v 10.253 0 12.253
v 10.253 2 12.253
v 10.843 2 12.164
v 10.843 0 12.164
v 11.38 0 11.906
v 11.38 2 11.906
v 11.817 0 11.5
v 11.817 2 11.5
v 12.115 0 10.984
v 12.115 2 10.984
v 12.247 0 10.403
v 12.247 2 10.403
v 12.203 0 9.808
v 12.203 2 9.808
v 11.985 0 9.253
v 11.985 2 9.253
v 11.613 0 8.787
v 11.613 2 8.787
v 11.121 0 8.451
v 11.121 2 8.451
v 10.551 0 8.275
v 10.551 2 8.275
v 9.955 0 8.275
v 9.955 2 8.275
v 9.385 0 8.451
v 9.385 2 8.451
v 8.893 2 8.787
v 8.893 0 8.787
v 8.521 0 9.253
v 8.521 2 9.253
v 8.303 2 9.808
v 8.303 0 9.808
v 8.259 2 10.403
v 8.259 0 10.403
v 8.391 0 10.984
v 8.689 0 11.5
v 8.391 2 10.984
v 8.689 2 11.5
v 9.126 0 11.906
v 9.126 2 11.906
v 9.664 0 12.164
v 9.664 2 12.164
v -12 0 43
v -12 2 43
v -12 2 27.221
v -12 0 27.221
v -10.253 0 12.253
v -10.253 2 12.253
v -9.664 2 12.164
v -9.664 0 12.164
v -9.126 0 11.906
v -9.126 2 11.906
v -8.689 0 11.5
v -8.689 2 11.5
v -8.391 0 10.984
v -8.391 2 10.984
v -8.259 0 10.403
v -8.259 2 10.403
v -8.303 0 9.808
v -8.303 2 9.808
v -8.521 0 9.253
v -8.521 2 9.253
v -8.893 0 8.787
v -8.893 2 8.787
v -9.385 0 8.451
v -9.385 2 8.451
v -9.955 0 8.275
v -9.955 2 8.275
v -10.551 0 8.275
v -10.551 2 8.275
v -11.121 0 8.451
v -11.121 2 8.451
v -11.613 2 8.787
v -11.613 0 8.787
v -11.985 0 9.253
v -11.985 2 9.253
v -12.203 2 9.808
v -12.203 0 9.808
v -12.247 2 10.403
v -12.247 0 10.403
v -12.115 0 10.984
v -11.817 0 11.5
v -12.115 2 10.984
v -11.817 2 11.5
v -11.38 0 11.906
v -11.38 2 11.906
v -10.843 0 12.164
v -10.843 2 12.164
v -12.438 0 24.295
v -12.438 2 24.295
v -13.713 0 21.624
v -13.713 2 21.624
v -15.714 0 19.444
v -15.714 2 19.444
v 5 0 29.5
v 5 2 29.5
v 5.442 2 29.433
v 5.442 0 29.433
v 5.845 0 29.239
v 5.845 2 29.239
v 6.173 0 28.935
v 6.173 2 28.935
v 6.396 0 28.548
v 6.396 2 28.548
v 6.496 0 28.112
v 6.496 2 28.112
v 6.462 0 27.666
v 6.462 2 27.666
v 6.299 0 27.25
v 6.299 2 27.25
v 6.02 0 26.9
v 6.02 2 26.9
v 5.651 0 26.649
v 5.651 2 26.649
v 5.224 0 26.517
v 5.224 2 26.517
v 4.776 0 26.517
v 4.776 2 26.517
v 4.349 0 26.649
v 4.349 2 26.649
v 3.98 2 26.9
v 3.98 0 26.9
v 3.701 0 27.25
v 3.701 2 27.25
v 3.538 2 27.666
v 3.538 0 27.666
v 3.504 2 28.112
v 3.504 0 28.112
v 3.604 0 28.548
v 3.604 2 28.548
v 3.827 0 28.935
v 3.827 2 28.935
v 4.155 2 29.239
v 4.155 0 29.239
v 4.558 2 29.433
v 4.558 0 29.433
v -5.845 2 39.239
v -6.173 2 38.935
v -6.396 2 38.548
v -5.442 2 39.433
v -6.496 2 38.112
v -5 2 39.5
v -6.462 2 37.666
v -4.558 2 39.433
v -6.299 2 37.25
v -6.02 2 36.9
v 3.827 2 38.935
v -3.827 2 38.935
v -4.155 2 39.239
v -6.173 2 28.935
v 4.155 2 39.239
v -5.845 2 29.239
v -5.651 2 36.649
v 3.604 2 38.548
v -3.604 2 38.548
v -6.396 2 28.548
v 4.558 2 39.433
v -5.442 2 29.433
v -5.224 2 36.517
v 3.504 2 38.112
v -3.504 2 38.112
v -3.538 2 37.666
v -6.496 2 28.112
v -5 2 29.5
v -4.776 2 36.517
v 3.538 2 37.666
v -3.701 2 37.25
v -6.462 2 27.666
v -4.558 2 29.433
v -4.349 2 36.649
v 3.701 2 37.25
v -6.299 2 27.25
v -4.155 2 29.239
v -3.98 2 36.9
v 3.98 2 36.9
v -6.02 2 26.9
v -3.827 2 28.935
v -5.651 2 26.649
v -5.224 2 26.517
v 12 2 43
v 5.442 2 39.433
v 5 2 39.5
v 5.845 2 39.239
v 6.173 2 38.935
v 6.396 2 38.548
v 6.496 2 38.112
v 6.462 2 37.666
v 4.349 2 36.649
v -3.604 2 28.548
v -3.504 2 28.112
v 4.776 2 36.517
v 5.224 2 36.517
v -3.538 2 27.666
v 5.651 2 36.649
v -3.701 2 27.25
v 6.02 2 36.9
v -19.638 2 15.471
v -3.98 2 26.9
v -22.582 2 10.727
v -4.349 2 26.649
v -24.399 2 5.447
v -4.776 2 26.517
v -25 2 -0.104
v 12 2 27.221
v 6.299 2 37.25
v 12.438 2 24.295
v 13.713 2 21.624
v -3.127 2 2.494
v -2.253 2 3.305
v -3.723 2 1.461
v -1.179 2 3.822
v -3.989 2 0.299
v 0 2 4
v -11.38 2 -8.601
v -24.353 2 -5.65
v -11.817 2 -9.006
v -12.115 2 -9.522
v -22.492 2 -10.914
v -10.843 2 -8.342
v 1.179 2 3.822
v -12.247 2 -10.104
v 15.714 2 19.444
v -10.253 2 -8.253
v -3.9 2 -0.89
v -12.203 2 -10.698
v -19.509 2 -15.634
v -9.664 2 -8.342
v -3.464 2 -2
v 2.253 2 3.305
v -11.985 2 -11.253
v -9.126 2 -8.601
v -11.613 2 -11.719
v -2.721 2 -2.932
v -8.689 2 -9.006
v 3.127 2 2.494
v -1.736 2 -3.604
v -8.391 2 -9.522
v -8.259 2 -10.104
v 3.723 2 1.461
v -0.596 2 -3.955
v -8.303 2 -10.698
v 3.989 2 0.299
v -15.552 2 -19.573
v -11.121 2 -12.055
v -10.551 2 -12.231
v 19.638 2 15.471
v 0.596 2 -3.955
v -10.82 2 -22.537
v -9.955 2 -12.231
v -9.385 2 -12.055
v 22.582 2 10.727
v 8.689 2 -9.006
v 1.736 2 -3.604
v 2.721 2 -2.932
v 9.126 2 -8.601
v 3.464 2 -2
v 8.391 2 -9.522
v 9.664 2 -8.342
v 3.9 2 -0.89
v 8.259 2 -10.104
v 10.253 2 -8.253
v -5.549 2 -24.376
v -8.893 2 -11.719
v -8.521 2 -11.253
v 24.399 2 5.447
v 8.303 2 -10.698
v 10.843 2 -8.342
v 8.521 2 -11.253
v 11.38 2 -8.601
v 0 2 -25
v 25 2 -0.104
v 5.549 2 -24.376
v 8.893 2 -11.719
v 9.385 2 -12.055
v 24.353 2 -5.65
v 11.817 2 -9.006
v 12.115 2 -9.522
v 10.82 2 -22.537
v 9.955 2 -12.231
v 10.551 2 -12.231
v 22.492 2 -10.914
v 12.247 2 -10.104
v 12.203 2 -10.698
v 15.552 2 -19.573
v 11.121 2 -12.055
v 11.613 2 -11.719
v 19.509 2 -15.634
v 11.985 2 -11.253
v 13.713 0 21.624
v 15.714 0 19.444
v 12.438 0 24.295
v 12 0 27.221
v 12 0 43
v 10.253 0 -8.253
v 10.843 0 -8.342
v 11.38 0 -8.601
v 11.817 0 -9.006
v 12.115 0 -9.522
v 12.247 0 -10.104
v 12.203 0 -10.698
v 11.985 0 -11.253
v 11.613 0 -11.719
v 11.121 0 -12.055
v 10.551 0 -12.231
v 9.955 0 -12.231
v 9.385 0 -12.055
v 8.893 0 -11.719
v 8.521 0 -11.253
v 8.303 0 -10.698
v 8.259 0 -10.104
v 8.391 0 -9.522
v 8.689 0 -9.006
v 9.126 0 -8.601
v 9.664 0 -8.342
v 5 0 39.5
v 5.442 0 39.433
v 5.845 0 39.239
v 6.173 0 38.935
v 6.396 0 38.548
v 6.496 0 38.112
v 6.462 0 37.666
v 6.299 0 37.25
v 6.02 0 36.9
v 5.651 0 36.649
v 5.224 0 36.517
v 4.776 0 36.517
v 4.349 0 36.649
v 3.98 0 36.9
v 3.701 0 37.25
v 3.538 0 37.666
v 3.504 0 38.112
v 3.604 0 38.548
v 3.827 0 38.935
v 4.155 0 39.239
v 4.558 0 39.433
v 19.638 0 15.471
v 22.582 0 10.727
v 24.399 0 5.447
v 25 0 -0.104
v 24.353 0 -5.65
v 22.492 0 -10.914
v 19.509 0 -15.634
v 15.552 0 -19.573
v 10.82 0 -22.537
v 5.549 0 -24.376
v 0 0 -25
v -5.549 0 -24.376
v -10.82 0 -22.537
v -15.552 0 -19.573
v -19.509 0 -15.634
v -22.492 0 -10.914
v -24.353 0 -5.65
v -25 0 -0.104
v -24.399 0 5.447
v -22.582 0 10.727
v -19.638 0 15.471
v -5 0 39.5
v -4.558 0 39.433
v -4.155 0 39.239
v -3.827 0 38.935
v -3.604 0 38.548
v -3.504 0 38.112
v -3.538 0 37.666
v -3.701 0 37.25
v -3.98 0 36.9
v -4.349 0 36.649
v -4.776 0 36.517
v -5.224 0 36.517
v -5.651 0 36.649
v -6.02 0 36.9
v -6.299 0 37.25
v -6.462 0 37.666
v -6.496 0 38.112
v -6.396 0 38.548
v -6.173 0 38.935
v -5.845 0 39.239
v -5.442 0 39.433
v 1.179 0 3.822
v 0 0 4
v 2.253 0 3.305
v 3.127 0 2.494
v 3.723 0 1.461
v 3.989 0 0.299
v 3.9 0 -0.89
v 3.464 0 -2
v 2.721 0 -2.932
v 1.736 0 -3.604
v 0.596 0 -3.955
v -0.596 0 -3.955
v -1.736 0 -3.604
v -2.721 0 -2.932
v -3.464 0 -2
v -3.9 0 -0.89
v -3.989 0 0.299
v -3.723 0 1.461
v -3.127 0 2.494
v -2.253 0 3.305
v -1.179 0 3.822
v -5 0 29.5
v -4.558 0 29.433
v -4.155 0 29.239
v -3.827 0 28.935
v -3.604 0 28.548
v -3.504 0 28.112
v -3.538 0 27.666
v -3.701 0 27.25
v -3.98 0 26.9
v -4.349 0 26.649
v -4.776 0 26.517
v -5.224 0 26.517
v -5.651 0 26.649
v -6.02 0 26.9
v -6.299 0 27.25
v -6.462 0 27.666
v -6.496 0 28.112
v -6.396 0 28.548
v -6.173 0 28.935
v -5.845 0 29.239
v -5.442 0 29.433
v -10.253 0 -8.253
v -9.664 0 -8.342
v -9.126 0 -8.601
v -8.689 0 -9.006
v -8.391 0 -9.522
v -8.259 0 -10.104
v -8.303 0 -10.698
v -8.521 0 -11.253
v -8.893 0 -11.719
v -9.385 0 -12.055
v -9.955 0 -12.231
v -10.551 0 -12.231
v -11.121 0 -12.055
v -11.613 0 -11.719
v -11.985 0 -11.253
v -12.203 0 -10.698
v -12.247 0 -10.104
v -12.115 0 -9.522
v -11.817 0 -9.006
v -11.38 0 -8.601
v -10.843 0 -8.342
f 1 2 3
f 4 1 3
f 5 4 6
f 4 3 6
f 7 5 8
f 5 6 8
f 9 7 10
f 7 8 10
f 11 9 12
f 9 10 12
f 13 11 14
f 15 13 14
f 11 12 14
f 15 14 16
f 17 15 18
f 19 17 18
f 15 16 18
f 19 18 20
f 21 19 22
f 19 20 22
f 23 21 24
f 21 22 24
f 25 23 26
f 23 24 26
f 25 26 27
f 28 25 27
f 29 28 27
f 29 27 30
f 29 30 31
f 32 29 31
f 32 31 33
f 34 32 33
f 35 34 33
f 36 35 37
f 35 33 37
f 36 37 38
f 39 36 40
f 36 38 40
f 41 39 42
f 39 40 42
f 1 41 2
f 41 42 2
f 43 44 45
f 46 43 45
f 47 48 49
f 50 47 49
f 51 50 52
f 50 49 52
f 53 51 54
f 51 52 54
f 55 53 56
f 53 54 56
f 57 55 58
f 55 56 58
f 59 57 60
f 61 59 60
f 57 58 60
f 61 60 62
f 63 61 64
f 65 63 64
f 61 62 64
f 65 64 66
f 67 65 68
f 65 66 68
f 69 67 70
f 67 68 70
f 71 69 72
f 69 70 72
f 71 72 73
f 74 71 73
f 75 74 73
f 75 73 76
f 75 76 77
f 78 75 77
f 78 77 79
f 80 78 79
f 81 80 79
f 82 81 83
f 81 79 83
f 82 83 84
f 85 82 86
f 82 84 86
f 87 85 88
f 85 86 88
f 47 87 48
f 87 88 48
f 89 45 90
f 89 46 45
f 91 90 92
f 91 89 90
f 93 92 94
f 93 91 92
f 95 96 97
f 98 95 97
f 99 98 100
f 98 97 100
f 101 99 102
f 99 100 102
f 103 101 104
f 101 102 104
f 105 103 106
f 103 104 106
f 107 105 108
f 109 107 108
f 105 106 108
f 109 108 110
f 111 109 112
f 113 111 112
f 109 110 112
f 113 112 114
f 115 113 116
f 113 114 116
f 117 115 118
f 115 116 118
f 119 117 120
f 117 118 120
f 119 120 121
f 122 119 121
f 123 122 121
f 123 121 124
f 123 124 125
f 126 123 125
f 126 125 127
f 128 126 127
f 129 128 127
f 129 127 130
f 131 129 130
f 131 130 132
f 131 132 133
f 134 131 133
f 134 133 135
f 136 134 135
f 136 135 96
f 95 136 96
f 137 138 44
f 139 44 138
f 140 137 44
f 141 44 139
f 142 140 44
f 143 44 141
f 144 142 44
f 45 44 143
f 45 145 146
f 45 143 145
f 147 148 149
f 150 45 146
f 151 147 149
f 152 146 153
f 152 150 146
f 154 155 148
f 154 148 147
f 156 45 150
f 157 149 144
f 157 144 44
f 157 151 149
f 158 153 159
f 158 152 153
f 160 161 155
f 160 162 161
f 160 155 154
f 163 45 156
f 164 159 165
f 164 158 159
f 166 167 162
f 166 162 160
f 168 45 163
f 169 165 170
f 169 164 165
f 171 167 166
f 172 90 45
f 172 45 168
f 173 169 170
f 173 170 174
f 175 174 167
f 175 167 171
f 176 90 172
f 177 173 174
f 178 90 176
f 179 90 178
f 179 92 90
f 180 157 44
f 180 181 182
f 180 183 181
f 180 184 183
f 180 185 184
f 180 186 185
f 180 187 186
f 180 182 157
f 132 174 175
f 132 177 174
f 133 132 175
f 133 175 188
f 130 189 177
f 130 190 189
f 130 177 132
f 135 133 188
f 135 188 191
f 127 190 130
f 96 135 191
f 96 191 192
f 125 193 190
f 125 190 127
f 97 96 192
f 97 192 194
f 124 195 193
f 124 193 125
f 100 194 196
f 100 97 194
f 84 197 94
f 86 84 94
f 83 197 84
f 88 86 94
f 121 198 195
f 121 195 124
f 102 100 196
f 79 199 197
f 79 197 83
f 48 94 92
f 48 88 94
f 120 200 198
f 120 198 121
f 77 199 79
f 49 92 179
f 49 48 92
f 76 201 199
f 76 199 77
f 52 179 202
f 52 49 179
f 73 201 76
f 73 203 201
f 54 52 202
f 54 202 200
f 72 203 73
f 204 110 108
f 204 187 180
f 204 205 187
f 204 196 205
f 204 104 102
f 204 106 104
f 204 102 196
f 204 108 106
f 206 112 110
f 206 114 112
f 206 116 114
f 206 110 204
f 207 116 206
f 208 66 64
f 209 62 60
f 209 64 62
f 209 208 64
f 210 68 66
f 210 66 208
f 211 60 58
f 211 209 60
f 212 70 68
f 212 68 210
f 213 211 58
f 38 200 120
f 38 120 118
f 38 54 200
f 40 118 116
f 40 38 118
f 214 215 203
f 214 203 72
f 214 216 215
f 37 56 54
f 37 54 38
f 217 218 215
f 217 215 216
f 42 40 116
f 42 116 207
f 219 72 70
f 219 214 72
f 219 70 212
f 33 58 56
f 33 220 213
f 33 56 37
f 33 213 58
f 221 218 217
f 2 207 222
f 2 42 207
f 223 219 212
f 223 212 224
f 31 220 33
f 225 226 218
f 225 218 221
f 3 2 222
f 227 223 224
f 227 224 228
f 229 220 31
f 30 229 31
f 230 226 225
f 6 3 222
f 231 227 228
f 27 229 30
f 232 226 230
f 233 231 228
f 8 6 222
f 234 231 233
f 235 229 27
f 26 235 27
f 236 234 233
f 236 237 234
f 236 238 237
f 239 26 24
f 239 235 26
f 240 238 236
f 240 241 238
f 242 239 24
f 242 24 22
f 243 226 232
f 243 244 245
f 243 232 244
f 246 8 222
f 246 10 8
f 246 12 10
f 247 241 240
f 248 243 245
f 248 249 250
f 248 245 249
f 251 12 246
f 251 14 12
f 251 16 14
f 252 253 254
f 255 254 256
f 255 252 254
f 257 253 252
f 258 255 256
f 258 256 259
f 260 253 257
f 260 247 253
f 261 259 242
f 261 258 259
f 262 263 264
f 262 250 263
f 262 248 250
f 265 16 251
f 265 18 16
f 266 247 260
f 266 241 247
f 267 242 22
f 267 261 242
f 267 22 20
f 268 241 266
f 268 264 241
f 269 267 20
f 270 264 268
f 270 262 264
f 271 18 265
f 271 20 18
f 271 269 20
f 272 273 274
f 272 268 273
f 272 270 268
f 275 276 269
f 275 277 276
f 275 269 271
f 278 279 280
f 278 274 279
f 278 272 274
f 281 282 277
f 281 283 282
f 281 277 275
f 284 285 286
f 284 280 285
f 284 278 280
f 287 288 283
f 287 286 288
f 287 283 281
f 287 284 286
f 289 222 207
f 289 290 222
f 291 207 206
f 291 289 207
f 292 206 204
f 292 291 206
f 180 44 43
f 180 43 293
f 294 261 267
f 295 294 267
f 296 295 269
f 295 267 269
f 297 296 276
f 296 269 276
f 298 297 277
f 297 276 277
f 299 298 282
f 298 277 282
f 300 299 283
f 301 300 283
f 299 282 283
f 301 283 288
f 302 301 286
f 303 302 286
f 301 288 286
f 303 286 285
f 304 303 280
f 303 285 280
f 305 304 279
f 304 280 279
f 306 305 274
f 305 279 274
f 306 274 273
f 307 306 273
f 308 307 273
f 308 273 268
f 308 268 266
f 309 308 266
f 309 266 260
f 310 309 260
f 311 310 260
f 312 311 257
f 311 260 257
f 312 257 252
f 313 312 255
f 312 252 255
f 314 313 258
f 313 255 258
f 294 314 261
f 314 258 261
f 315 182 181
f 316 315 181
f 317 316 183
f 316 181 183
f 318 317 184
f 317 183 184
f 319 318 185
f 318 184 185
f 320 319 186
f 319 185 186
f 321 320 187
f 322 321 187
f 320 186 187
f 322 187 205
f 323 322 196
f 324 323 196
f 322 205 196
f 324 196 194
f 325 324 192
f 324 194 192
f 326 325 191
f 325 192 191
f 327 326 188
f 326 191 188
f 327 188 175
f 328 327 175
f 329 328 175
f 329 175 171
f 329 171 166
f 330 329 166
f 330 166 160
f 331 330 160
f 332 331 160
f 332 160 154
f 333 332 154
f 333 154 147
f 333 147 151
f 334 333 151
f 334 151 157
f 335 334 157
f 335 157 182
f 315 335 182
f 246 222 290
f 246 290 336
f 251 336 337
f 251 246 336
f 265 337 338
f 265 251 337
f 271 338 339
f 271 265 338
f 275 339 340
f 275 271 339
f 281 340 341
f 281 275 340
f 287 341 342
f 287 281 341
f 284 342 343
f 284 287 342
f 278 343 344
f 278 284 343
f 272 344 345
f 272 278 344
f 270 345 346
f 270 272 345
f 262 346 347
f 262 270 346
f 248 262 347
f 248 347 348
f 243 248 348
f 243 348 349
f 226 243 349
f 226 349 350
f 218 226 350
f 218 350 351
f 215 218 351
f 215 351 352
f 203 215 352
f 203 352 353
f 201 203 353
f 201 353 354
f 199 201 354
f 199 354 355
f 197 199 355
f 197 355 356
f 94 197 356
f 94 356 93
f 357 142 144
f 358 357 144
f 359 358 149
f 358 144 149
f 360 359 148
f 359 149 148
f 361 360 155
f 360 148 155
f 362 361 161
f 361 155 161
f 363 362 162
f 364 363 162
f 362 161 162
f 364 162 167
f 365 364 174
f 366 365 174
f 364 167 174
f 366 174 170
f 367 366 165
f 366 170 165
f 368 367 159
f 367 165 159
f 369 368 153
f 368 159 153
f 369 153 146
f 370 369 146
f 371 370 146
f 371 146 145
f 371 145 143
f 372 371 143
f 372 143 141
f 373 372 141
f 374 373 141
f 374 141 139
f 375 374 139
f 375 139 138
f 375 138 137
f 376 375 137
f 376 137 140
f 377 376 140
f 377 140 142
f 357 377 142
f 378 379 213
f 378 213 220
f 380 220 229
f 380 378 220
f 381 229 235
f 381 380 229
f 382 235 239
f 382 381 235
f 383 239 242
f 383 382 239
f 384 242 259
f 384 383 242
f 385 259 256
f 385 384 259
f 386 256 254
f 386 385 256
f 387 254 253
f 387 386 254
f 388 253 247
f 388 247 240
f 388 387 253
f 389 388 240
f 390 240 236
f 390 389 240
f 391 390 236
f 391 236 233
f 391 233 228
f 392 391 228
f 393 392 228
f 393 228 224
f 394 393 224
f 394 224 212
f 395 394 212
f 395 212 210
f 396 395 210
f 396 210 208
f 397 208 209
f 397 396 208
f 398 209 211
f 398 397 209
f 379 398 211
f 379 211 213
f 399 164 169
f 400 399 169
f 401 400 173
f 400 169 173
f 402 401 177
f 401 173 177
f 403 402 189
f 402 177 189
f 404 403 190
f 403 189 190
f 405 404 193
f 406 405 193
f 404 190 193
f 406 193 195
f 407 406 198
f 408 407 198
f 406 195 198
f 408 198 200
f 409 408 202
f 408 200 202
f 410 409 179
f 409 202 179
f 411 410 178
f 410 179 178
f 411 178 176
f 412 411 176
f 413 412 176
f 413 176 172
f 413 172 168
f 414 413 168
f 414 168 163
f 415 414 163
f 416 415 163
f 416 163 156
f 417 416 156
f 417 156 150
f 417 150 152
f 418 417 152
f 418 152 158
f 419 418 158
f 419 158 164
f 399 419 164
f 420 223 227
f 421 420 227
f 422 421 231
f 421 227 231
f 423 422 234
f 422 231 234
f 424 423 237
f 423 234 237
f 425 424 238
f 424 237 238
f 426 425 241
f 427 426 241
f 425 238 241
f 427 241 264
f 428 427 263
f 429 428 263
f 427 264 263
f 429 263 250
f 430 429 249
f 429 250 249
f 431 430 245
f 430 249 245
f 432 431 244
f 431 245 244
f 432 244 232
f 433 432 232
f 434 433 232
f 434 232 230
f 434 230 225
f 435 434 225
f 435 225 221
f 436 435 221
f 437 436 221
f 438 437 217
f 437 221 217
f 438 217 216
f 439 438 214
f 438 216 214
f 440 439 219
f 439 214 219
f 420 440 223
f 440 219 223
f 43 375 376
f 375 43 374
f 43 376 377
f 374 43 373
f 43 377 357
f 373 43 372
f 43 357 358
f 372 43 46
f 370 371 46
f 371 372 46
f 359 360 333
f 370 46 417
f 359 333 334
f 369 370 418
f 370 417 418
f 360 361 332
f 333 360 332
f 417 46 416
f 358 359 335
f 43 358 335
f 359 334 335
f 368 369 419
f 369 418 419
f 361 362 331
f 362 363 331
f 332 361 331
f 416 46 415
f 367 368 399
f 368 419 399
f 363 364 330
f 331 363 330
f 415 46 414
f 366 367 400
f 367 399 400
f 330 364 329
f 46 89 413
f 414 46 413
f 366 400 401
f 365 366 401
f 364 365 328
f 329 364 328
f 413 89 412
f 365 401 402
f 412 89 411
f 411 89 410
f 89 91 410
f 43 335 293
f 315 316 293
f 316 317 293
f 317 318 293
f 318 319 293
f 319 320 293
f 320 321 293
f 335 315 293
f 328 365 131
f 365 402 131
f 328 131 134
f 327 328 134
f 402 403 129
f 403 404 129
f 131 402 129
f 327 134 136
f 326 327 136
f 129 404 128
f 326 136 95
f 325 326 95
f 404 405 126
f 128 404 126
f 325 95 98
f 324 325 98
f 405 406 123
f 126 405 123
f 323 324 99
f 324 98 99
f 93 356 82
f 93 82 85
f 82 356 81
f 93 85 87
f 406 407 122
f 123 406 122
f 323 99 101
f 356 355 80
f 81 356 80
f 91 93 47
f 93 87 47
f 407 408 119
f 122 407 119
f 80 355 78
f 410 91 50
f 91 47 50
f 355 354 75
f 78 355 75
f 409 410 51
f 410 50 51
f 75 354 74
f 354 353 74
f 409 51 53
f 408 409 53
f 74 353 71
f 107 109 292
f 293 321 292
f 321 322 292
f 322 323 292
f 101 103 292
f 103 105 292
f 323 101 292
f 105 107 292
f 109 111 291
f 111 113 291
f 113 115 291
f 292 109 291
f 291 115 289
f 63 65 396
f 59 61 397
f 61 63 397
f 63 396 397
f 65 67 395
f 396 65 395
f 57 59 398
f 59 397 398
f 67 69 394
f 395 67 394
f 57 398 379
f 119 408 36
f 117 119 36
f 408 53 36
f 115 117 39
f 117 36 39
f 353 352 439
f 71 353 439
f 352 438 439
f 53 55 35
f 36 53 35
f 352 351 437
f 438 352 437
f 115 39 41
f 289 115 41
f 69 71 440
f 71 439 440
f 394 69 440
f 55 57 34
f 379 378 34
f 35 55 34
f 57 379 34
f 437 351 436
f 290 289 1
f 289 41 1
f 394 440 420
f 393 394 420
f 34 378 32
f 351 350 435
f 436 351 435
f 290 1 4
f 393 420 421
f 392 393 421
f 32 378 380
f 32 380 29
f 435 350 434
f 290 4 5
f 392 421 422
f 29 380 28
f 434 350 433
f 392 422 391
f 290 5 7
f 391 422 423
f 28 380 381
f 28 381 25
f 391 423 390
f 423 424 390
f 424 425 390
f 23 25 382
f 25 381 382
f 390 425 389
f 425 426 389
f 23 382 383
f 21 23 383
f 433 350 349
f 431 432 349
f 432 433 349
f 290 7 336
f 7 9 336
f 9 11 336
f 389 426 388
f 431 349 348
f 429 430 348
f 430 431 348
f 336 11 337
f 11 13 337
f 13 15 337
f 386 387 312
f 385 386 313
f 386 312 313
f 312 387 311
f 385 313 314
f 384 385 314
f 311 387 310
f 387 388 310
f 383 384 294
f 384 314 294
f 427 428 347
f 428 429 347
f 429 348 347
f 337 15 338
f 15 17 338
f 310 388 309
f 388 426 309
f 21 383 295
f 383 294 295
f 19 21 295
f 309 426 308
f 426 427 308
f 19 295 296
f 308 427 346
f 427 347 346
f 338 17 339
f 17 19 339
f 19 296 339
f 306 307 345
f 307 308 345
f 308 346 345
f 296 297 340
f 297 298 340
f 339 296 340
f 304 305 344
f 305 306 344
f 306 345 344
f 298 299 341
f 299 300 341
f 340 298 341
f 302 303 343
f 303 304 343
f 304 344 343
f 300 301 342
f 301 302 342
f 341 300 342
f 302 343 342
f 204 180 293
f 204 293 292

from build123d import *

# Parameters (mm, degrees)
SKETCH_2_R          = 6
SKETCH_2_R_2        = 4
EXTRUDE_1_DEPTH     = 2
SKETCH_4_R          = 25
SKETCH_4_R_2        = 5
SKETCH_4_R_3        = 2
EXTRUDE_3_DEPTH     = 2
SKETCH_3_W          = 24
SKETCH_3_H          = 21.068287801
EXTRUDE_2_DEPTH     = 2
SKETCH_5_R          = 1.5
CUT_EXTRUDE_1_DEPTH = 50.779513859
FILLET_1_R          = 10


with BuildPart() as part:
    # 草图2 → 凸台-拉伸1 (new body)
    with BuildSketch(Plane(origin=(0, 0, 0), x_dir=(1, 0, 0), z_dir=(0, 1, 0))):
        with Locations(Location((0, 0, 0), (0, 0, 270))):
            Circle(SKETCH_2_R)
        with Locations(Location((0, 0, 0), (0, 0, 270))):
            Circle(SKETCH_2_R_2, mode=Mode.SUBTRACT)
    extrude(amount=EXTRUDE_1_DEPTH)

    # 草图4 → 凸台-拉伸3 (add)
    with BuildSketch(Plane(origin=(0, 2, 0), x_dir=(1, 0, 0), z_dir=(0, 1, 0))):
        with Locations(Location((0, 0, 0), (0, 0, 270))):
            Circle(SKETCH_4_R)
        Circle(SKETCH_4_R_2, mode=Mode.SUBTRACT)
        with Locations(Location((-10.253048327, 10.253048327, 0), (0, 0, 270))):
            Circle(SKETCH_4_R_3, mode=Mode.SUBTRACT)
        with Locations(Location((10.253048327, 10.253048327, 0), (0, 0, 270))):
            Circle(SKETCH_4_R_3, mode=Mode.SUBTRACT)
        with Locations(Location((-10.253048327, -10.253048327, 0), (0, 0, 270))):
            Circle(SKETCH_4_R_3, mode=Mode.SUBTRACT)
        with Locations(Location((10.253048327, -10.253048327, 0), (0, 0, 270))):
            Circle(SKETCH_4_R_3, mode=Mode.SUBTRACT)
    extrude(amount=-EXTRUDE_3_DEPTH)

    # 草图3 → 凸台-拉伸2 (add)
    with BuildSketch(Plane(origin=(0, 2, 0), x_dir=(1, 0, 0), z_dir=(0, 1, 0))):
        with Locations((0, -32.4658561)):
            Rectangle(SKETCH_3_W, SKETCH_3_H)
    extrude(amount=-EXTRUDE_2_DEPTH)

    # 草图5 → 切除-拉伸1 (cut, through all)
    with BuildSketch(Plane(origin=(0, 2, 0), x_dir=(1, 0, 0), z_dir=(0, 1, 0))):
        with Locations(Location((5, -28, 0), (0, 0, 270))):
            Circle(SKETCH_5_R)
        with Locations(Location((5, -38, 0), (0, 0, 270))):
            Circle(SKETCH_5_R)
        with Locations(Location((-5, -28, 0), (0, 0, 270))):
            Circle(SKETCH_5_R)
        with Locations(Location((-5, -38, 0), (0, 0, 270))):
            Circle(SKETCH_5_R)
    extrude(amount=-CUT_EXTRUDE_1_DEPTH, mode=Mode.SUBTRACT)

    # 圆角1
    fillet_1_edges = [part.edges().sort_by_distance(p)[0] for p in [
        (12, 1, 21.931712199),
        (-12, 1, 21.931712199),
    ]]
    fillet(fillet_1_edges, radius=FILLET_1_R)


solid = part.part
